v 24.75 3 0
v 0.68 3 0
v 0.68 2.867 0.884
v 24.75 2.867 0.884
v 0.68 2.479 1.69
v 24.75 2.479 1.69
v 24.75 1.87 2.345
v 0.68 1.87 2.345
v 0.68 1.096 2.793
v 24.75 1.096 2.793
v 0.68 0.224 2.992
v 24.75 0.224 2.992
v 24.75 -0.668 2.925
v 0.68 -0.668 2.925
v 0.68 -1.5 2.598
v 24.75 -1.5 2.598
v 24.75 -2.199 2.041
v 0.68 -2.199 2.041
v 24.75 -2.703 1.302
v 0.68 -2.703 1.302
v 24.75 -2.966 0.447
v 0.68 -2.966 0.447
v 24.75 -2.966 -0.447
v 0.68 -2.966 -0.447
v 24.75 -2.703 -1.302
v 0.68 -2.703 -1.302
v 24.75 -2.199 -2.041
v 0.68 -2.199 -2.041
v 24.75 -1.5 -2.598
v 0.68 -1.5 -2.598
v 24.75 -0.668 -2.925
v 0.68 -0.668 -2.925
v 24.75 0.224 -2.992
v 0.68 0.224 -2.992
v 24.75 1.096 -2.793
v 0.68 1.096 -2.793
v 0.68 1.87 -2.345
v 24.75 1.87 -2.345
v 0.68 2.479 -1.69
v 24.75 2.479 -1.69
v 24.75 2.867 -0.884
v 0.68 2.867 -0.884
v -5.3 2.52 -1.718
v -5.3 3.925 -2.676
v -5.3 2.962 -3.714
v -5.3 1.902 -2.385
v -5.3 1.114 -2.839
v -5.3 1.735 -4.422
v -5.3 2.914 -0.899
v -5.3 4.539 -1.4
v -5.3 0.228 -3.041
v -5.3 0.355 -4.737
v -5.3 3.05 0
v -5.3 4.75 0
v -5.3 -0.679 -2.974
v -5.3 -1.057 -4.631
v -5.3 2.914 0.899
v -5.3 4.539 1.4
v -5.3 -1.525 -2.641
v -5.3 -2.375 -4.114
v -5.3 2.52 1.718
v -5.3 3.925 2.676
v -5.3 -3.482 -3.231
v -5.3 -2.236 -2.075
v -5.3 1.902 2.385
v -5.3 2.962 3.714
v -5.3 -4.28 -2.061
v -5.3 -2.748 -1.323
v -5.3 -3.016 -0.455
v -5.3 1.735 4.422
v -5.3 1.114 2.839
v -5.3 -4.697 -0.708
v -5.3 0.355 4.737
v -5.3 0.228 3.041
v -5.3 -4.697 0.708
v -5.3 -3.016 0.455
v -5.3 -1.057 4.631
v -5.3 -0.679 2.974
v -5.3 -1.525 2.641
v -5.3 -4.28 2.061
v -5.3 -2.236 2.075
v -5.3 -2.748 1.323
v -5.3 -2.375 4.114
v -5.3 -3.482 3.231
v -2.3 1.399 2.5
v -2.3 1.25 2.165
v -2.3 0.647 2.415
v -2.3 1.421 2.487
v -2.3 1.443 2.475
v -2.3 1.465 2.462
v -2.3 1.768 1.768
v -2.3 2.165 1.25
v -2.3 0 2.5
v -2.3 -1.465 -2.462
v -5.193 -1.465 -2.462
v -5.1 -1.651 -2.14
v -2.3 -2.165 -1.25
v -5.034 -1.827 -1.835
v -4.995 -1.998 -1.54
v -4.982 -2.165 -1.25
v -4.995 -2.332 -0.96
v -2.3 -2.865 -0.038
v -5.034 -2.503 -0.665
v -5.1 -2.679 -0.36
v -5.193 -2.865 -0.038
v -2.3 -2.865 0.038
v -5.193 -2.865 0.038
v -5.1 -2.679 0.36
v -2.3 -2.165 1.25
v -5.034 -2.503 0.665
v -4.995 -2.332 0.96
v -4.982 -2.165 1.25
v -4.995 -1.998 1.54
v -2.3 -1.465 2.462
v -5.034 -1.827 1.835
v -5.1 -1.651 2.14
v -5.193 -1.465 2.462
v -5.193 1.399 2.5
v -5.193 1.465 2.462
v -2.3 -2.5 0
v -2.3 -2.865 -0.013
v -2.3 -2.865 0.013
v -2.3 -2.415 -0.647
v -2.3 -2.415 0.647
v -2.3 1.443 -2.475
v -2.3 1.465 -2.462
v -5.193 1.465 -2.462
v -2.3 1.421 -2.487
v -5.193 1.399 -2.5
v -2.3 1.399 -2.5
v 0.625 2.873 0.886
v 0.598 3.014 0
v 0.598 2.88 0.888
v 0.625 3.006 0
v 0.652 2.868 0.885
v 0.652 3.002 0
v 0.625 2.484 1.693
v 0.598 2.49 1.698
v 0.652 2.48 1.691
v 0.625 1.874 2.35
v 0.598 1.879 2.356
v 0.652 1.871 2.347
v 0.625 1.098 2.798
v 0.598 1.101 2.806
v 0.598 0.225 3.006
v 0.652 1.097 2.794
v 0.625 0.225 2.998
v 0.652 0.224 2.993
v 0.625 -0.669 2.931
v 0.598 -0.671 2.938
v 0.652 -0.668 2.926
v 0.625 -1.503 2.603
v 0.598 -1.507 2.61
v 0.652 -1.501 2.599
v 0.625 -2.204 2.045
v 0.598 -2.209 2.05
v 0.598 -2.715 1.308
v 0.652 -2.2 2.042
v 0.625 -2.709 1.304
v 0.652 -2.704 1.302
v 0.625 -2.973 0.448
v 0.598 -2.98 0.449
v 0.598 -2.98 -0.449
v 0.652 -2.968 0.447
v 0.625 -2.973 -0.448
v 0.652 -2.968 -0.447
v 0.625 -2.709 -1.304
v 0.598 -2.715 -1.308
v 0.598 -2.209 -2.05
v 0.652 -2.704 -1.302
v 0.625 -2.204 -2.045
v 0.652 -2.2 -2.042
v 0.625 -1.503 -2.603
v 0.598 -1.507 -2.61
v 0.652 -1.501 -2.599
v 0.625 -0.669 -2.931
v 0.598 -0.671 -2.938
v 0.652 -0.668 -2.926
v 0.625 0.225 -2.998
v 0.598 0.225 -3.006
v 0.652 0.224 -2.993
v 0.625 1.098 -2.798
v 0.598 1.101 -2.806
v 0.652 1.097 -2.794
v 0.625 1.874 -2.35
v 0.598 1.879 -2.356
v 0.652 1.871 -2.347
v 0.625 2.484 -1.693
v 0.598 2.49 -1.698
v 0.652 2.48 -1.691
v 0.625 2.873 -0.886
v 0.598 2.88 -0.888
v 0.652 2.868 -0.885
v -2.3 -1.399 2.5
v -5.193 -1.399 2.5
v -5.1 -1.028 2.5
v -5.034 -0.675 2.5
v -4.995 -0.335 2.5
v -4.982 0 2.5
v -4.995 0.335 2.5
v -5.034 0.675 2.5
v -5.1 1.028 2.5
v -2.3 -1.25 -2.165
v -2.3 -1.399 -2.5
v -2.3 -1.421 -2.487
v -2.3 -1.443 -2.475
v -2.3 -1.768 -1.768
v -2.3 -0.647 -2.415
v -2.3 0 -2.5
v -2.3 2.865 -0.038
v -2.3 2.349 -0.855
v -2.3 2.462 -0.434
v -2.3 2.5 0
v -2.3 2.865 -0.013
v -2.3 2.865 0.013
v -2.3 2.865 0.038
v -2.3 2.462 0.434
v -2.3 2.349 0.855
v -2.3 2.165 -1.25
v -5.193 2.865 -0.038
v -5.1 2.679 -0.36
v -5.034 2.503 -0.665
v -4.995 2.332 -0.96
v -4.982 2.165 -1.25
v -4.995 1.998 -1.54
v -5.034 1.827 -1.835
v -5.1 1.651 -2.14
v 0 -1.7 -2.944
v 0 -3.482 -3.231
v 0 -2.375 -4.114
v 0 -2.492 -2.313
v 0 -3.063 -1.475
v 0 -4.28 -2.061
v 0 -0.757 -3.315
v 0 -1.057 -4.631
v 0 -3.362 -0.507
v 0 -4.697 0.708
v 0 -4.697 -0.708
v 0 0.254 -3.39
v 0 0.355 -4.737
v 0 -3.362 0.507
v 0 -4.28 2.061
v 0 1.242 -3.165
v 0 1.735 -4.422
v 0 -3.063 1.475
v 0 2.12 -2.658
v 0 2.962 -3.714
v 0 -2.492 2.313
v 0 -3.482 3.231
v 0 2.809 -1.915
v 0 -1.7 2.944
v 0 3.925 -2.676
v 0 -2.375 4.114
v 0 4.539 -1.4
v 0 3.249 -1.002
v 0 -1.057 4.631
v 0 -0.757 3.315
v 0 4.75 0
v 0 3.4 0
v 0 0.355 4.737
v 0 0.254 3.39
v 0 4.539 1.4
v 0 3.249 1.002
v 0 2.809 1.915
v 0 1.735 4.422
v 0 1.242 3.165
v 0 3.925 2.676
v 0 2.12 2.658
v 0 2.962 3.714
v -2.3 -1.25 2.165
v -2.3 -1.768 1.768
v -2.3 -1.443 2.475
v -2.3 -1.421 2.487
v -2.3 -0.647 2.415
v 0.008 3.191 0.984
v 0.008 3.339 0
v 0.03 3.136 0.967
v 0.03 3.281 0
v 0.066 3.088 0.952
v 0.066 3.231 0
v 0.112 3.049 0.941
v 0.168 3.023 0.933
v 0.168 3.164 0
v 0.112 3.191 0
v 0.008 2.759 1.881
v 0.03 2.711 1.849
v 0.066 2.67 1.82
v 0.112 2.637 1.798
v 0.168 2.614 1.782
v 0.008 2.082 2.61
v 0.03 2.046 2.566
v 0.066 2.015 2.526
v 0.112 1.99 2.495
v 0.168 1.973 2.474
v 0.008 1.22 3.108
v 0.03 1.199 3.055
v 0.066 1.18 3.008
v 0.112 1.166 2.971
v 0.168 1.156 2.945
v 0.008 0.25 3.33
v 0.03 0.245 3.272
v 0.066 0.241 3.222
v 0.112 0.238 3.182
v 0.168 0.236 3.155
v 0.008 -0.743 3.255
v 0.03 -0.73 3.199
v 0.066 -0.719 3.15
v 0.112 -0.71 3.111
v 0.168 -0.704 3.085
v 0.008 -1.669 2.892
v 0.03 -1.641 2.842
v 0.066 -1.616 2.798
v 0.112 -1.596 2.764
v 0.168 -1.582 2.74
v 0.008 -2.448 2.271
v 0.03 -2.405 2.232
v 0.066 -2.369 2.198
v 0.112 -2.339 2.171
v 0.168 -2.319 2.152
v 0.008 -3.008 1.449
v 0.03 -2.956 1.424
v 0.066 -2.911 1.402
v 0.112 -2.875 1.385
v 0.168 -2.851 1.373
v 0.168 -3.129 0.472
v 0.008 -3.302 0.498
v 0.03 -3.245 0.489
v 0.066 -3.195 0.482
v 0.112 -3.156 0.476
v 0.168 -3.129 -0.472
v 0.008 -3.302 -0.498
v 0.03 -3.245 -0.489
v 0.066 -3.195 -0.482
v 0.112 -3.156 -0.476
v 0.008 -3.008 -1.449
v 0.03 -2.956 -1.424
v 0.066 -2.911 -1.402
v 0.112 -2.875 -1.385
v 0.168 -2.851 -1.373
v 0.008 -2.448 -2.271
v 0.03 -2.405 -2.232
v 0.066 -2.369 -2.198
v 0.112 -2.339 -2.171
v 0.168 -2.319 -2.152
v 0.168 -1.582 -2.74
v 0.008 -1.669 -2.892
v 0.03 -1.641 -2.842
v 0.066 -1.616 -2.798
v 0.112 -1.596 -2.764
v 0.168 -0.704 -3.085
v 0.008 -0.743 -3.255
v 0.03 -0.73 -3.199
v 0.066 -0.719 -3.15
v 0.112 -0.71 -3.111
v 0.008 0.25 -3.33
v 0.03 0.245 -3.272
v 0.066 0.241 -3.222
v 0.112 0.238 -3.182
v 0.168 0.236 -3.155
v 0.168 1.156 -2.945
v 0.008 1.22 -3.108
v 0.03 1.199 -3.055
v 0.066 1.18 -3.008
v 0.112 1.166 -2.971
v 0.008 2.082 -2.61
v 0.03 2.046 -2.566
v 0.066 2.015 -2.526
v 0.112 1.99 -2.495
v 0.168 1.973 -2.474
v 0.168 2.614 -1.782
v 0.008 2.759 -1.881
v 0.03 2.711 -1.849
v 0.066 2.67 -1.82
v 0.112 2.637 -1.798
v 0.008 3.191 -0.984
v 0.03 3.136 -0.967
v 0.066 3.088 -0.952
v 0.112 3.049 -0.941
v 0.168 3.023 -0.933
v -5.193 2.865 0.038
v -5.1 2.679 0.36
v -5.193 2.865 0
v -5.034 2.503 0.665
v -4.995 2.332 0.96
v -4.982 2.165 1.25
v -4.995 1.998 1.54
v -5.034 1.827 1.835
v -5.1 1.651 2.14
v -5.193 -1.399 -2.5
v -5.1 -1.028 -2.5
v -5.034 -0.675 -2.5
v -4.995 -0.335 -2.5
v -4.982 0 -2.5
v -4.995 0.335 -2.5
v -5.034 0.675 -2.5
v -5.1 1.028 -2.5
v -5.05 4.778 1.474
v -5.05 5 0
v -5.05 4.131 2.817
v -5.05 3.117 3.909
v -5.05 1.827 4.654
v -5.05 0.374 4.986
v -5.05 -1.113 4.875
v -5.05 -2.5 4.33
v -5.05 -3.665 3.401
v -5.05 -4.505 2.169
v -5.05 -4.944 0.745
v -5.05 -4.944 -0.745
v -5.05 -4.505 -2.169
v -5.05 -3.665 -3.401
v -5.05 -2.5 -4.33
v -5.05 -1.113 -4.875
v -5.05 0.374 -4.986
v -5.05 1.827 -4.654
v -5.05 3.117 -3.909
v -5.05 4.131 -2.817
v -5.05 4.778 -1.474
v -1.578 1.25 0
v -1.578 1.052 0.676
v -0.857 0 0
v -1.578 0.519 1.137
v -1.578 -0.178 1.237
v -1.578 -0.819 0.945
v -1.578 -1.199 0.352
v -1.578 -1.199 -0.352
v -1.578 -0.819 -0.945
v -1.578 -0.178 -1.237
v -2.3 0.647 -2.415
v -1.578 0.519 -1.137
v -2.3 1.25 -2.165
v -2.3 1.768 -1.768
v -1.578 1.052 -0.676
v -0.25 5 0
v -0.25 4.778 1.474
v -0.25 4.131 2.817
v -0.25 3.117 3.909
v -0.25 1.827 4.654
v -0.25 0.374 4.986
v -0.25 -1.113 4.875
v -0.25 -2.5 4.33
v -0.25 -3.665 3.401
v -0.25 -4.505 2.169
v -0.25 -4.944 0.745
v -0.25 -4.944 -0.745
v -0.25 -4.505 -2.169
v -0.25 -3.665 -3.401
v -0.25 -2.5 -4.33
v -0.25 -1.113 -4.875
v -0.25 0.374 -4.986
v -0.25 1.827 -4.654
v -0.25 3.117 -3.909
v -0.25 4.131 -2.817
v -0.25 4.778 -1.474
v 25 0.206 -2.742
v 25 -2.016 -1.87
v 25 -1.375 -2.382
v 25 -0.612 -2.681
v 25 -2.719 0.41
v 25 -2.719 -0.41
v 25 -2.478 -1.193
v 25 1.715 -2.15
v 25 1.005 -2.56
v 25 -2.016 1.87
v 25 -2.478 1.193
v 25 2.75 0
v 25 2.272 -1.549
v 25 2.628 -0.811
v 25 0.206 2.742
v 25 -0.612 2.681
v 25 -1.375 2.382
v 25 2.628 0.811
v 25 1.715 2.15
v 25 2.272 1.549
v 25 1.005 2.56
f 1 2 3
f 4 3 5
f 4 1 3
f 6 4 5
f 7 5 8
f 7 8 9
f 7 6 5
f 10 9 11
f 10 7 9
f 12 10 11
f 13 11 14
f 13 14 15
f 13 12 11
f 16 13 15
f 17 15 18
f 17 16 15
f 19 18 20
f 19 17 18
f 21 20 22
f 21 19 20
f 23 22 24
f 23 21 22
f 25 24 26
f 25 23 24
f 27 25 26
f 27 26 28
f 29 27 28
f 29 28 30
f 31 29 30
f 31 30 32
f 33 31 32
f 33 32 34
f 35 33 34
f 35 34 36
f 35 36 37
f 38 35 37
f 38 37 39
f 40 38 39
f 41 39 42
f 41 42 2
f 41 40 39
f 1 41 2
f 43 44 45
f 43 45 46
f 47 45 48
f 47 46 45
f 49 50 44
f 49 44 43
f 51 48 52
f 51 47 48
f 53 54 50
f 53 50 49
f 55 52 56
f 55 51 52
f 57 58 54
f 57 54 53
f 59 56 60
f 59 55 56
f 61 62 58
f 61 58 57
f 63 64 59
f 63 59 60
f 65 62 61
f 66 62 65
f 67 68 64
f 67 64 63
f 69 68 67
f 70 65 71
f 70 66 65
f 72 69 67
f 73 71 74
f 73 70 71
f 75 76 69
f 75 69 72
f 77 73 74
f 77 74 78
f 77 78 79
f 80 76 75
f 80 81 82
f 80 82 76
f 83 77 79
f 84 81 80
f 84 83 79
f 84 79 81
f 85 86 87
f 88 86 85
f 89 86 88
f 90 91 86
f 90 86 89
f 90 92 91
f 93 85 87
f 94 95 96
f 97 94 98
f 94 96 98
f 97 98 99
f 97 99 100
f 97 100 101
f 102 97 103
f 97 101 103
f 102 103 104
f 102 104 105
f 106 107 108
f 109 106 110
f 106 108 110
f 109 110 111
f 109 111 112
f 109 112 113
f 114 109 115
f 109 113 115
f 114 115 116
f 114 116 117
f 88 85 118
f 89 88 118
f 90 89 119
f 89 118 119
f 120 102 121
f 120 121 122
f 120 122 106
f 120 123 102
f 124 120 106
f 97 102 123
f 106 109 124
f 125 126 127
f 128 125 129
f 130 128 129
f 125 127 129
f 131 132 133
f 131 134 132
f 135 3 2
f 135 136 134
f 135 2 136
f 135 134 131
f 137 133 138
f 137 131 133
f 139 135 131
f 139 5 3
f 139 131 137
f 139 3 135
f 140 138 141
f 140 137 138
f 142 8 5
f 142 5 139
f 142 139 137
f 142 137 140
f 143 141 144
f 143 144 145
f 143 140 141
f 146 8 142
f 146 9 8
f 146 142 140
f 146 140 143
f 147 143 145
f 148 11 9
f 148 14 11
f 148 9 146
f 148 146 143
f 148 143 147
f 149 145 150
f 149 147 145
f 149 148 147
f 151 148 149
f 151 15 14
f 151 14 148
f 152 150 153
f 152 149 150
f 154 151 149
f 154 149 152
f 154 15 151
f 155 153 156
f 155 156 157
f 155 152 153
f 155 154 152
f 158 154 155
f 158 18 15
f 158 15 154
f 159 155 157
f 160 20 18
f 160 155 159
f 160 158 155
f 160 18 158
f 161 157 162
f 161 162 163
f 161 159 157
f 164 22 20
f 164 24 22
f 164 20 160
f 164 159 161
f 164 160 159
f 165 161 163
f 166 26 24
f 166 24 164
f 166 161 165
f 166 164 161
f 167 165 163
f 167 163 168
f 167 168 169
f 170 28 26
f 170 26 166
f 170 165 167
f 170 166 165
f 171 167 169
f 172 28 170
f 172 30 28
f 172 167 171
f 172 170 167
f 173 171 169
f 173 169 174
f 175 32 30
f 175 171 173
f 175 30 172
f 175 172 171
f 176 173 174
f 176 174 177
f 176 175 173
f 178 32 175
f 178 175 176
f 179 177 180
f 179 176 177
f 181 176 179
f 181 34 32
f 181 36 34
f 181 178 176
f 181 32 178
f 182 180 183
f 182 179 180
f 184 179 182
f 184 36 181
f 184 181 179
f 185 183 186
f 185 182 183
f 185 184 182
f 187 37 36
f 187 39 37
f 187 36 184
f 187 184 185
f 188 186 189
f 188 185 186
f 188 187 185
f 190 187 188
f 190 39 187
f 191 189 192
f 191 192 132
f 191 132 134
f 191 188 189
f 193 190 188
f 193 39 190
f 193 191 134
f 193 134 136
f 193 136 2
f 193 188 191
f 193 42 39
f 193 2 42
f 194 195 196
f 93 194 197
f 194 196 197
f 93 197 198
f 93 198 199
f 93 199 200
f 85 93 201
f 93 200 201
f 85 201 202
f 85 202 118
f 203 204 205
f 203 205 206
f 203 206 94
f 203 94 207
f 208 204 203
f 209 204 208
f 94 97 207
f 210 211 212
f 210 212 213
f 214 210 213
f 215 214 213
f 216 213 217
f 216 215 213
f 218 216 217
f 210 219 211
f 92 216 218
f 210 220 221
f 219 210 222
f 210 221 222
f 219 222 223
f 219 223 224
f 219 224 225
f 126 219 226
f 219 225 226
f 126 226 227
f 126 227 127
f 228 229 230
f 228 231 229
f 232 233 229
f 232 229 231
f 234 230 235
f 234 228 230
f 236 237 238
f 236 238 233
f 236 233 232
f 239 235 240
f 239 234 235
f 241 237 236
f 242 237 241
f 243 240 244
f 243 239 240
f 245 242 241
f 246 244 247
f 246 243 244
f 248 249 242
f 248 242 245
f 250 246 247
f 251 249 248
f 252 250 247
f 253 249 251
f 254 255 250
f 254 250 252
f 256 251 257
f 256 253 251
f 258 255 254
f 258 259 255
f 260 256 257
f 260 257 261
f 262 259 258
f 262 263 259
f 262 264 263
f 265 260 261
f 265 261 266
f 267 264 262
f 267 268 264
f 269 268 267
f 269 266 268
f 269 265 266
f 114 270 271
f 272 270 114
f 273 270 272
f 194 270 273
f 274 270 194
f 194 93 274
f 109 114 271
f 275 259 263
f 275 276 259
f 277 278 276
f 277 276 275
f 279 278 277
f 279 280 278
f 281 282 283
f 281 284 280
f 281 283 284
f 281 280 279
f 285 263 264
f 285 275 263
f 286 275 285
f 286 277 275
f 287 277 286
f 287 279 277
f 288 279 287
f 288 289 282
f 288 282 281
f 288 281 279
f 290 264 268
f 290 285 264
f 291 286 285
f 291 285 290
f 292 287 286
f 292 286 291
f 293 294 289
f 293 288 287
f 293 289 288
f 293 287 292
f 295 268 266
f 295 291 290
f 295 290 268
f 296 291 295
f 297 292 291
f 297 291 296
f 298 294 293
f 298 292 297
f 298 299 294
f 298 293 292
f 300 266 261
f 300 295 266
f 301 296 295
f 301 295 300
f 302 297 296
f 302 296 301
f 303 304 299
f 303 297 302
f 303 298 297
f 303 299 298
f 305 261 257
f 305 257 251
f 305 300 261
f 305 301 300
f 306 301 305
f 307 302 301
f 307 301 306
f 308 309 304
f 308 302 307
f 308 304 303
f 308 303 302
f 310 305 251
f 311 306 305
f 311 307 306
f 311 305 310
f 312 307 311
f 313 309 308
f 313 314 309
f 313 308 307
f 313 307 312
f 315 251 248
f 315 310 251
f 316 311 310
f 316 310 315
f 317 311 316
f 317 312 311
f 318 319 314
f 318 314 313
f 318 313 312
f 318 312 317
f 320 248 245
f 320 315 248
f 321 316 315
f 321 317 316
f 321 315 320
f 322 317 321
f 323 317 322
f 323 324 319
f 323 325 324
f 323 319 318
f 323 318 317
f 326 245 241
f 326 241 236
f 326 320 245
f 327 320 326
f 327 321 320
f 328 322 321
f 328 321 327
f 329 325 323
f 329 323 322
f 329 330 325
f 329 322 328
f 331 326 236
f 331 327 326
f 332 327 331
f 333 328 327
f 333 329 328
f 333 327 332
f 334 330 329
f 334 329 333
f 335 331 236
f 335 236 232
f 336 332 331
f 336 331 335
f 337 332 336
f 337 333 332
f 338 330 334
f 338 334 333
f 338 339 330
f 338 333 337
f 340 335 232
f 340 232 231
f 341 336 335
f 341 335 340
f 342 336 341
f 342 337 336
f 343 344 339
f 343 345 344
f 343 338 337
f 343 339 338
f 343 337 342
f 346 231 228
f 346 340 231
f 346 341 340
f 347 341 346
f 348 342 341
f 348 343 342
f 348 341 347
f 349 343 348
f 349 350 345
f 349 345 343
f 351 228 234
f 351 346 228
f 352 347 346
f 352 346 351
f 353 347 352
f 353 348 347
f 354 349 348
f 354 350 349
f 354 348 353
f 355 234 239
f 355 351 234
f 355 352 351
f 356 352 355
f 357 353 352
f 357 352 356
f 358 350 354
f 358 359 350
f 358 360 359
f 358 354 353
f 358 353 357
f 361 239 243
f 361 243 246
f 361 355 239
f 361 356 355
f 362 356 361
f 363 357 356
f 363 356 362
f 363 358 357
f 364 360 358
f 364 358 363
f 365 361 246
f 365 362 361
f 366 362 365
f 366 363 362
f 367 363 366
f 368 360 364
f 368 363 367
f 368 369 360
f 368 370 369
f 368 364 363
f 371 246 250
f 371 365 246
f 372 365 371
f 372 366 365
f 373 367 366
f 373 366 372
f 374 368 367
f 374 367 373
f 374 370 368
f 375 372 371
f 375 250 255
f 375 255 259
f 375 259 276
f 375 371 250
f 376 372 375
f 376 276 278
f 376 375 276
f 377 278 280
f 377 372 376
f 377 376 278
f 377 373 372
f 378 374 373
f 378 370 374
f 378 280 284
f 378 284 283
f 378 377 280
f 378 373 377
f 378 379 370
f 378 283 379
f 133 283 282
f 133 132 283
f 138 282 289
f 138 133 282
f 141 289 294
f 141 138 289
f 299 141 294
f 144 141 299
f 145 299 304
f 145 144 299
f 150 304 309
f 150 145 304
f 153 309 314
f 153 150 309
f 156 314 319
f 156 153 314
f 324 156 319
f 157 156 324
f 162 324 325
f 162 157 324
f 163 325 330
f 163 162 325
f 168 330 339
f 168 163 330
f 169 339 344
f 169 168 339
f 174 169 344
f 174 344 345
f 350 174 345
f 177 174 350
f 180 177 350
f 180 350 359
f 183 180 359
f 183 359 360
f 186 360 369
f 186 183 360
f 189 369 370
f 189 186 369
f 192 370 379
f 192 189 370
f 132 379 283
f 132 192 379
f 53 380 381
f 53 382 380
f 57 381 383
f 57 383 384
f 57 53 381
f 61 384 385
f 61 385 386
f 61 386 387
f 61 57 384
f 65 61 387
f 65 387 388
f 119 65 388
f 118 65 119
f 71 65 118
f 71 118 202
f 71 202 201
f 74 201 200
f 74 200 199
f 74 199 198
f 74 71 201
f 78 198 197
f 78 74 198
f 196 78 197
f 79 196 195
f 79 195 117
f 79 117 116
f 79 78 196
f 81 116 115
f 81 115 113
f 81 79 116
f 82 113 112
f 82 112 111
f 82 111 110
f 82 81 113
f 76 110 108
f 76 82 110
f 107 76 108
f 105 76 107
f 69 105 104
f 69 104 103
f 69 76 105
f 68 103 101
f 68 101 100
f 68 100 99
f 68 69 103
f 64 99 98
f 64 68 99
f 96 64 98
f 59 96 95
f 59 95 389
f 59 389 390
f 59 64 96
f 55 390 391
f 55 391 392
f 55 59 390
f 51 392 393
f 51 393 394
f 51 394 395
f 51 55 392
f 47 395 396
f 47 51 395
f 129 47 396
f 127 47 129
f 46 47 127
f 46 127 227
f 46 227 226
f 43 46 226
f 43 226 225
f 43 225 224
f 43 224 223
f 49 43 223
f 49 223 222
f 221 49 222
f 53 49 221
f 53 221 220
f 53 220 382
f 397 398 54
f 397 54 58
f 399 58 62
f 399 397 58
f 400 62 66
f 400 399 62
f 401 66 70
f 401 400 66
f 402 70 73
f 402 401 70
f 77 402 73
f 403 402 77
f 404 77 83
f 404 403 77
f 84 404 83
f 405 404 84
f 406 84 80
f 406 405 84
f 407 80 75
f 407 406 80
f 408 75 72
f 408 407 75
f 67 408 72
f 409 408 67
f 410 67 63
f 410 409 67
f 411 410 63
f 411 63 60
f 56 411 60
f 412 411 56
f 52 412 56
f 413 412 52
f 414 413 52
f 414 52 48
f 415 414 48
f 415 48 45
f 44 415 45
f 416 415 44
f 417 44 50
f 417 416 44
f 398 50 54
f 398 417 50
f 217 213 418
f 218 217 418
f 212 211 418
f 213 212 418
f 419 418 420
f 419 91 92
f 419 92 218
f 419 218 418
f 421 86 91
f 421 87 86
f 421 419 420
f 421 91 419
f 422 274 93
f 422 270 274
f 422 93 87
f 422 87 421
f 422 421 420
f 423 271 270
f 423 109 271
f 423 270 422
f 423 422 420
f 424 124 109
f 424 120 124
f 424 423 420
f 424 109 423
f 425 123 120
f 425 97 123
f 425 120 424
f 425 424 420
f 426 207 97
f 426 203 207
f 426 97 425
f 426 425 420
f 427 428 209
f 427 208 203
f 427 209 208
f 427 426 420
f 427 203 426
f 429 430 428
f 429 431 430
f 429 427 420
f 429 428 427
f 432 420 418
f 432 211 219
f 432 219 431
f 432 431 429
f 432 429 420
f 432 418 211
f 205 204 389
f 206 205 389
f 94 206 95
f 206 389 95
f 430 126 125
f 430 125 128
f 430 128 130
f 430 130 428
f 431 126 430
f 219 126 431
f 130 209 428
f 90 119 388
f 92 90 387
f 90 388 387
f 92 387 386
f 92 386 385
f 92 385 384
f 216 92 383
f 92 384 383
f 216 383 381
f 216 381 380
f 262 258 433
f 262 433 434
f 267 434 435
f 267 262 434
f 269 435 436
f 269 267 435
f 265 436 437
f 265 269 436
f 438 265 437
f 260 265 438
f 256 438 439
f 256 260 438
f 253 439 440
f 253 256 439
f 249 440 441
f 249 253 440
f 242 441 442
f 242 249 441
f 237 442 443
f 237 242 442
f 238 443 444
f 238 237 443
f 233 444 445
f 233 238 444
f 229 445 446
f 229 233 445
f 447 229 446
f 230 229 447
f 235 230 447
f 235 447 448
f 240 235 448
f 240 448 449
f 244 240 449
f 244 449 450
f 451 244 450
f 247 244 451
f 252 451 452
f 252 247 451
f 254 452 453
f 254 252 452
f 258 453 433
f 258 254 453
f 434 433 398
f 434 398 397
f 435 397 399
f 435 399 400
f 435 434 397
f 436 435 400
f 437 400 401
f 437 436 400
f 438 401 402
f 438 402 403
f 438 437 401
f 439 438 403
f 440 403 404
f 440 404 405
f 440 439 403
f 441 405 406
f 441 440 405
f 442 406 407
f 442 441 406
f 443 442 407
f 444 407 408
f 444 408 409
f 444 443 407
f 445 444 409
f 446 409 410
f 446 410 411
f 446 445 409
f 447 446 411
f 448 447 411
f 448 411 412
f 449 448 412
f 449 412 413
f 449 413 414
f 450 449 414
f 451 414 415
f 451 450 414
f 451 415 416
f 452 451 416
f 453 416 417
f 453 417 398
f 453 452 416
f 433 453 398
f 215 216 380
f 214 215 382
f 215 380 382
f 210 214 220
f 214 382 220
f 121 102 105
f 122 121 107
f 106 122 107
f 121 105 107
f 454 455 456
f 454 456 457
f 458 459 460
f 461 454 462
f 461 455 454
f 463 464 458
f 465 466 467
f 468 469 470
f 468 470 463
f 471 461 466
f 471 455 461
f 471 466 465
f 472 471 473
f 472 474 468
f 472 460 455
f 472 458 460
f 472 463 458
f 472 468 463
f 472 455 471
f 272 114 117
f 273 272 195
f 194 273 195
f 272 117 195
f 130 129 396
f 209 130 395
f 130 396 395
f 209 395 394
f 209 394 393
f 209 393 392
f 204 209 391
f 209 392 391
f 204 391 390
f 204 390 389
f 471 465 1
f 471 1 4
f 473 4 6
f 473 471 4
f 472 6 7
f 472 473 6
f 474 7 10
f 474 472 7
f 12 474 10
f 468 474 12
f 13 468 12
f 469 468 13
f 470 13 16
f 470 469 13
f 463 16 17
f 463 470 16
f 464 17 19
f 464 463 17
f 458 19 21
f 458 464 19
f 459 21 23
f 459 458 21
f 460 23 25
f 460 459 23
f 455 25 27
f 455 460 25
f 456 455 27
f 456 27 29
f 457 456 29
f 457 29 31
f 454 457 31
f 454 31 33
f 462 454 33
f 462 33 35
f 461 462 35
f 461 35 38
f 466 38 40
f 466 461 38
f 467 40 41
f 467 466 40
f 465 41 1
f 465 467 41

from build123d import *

# Parameters (mm, degrees)
CUT_EXTRUDE_1_DEPTH = 3
CHAMFER_1_SIZE      = 0.25


with BuildPart() as part:
    # Эскиз1 → Повернуть1 (revolve)
    with BuildSketch(Plane.XY):
        with BuildLine():
            Line((-4.982457352, 2.5), (-5.3, 3.05))
            Line((-5.3, 3.05), (-5.3, 5))
            Line((-5.3, 5), (0, 5))
            Line((0, 5), (0, 3.4))
            ThreePointArc((0, 3.4), (0.046179295, 3.255234258), (0.167656961, 3.163949955))
            Line((0.167656961, 3.163949955), (0.597656961, 3.013949955))
            ThreePointArc((0.597656961, 3.013949955), (0.638241835, 3.003512159), (0.68, 3))
            Line((0.68, 3), (25, 3))
            Line((25, 3), (25, 0))
            Line((25, 0), (-0.856624327, 0))
            Line((-0.856624327, 0), (-2.3, 2.5))
            Line((-2.3, 2.5), (-4.982457352, 2.5))
        make_face()
    revolve(axis=Axis((-1000, 0, 0), (1, 0, 0)))

    # Эскиз2 → Вырез-Вытянуть1 (cut)
    with BuildSketch(Plane.ZY.offset(5.3)):
        with BuildLine():
            Line((-0.038113557, 2.864746473), (-2.461886443, 1.465380546))
            ThreePointArc((-2.461886443, 1.465380546), (-2.481162782, 1.4325), (-2.5, 1.399365928))
            Line((-2.5, 1.399365928), (-2.5, -1.399365928))
            ThreePointArc((-2.5, -1.399365928), (-2.481162782, -1.4325), (-2.461886443, -1.465380546))
            Line((-2.461886443, -1.465380546), (-0.038113557, -2.864746473))
            ThreePointArc((-0.038113557, -2.864746473), (0, -2.865), (0.038113557, -2.864746473))
            Line((0.038113557, -2.864746473), (2.461886443, -1.465380546))
            ThreePointArc((2.461886443, -1.465380546), (2.481162782, -1.4325), (2.5, -1.399365928))
            Line((2.5, -1.399365928), (2.5, 1.399365928))
            ThreePointArc((2.5, 1.399365928), (2.481162782, 1.4325), (2.461886443, 1.465380546))
            Line((2.461886443, 1.465380546), (0.038113557, 2.864746473))
            ThreePointArc((0.038113557, 2.864746473), (0, 2.865), (-0.038113557, 2.864746473))
        make_face()
    extrude(amount=-CUT_EXTRUDE_1_DEPTH, mode=Mode.SUBTRACT)

    # Фаска1
    chamfer_1_edges = [part.edges().sort_by_distance(p)[0] for p in [
        (-5.3, -5, 0),
        (0, -5, 0),
        (25, -3, 0),
    ]]
    chamfer(chamfer_1_edges, length=CHAMFER_1_SIZE)


solid = part.part
